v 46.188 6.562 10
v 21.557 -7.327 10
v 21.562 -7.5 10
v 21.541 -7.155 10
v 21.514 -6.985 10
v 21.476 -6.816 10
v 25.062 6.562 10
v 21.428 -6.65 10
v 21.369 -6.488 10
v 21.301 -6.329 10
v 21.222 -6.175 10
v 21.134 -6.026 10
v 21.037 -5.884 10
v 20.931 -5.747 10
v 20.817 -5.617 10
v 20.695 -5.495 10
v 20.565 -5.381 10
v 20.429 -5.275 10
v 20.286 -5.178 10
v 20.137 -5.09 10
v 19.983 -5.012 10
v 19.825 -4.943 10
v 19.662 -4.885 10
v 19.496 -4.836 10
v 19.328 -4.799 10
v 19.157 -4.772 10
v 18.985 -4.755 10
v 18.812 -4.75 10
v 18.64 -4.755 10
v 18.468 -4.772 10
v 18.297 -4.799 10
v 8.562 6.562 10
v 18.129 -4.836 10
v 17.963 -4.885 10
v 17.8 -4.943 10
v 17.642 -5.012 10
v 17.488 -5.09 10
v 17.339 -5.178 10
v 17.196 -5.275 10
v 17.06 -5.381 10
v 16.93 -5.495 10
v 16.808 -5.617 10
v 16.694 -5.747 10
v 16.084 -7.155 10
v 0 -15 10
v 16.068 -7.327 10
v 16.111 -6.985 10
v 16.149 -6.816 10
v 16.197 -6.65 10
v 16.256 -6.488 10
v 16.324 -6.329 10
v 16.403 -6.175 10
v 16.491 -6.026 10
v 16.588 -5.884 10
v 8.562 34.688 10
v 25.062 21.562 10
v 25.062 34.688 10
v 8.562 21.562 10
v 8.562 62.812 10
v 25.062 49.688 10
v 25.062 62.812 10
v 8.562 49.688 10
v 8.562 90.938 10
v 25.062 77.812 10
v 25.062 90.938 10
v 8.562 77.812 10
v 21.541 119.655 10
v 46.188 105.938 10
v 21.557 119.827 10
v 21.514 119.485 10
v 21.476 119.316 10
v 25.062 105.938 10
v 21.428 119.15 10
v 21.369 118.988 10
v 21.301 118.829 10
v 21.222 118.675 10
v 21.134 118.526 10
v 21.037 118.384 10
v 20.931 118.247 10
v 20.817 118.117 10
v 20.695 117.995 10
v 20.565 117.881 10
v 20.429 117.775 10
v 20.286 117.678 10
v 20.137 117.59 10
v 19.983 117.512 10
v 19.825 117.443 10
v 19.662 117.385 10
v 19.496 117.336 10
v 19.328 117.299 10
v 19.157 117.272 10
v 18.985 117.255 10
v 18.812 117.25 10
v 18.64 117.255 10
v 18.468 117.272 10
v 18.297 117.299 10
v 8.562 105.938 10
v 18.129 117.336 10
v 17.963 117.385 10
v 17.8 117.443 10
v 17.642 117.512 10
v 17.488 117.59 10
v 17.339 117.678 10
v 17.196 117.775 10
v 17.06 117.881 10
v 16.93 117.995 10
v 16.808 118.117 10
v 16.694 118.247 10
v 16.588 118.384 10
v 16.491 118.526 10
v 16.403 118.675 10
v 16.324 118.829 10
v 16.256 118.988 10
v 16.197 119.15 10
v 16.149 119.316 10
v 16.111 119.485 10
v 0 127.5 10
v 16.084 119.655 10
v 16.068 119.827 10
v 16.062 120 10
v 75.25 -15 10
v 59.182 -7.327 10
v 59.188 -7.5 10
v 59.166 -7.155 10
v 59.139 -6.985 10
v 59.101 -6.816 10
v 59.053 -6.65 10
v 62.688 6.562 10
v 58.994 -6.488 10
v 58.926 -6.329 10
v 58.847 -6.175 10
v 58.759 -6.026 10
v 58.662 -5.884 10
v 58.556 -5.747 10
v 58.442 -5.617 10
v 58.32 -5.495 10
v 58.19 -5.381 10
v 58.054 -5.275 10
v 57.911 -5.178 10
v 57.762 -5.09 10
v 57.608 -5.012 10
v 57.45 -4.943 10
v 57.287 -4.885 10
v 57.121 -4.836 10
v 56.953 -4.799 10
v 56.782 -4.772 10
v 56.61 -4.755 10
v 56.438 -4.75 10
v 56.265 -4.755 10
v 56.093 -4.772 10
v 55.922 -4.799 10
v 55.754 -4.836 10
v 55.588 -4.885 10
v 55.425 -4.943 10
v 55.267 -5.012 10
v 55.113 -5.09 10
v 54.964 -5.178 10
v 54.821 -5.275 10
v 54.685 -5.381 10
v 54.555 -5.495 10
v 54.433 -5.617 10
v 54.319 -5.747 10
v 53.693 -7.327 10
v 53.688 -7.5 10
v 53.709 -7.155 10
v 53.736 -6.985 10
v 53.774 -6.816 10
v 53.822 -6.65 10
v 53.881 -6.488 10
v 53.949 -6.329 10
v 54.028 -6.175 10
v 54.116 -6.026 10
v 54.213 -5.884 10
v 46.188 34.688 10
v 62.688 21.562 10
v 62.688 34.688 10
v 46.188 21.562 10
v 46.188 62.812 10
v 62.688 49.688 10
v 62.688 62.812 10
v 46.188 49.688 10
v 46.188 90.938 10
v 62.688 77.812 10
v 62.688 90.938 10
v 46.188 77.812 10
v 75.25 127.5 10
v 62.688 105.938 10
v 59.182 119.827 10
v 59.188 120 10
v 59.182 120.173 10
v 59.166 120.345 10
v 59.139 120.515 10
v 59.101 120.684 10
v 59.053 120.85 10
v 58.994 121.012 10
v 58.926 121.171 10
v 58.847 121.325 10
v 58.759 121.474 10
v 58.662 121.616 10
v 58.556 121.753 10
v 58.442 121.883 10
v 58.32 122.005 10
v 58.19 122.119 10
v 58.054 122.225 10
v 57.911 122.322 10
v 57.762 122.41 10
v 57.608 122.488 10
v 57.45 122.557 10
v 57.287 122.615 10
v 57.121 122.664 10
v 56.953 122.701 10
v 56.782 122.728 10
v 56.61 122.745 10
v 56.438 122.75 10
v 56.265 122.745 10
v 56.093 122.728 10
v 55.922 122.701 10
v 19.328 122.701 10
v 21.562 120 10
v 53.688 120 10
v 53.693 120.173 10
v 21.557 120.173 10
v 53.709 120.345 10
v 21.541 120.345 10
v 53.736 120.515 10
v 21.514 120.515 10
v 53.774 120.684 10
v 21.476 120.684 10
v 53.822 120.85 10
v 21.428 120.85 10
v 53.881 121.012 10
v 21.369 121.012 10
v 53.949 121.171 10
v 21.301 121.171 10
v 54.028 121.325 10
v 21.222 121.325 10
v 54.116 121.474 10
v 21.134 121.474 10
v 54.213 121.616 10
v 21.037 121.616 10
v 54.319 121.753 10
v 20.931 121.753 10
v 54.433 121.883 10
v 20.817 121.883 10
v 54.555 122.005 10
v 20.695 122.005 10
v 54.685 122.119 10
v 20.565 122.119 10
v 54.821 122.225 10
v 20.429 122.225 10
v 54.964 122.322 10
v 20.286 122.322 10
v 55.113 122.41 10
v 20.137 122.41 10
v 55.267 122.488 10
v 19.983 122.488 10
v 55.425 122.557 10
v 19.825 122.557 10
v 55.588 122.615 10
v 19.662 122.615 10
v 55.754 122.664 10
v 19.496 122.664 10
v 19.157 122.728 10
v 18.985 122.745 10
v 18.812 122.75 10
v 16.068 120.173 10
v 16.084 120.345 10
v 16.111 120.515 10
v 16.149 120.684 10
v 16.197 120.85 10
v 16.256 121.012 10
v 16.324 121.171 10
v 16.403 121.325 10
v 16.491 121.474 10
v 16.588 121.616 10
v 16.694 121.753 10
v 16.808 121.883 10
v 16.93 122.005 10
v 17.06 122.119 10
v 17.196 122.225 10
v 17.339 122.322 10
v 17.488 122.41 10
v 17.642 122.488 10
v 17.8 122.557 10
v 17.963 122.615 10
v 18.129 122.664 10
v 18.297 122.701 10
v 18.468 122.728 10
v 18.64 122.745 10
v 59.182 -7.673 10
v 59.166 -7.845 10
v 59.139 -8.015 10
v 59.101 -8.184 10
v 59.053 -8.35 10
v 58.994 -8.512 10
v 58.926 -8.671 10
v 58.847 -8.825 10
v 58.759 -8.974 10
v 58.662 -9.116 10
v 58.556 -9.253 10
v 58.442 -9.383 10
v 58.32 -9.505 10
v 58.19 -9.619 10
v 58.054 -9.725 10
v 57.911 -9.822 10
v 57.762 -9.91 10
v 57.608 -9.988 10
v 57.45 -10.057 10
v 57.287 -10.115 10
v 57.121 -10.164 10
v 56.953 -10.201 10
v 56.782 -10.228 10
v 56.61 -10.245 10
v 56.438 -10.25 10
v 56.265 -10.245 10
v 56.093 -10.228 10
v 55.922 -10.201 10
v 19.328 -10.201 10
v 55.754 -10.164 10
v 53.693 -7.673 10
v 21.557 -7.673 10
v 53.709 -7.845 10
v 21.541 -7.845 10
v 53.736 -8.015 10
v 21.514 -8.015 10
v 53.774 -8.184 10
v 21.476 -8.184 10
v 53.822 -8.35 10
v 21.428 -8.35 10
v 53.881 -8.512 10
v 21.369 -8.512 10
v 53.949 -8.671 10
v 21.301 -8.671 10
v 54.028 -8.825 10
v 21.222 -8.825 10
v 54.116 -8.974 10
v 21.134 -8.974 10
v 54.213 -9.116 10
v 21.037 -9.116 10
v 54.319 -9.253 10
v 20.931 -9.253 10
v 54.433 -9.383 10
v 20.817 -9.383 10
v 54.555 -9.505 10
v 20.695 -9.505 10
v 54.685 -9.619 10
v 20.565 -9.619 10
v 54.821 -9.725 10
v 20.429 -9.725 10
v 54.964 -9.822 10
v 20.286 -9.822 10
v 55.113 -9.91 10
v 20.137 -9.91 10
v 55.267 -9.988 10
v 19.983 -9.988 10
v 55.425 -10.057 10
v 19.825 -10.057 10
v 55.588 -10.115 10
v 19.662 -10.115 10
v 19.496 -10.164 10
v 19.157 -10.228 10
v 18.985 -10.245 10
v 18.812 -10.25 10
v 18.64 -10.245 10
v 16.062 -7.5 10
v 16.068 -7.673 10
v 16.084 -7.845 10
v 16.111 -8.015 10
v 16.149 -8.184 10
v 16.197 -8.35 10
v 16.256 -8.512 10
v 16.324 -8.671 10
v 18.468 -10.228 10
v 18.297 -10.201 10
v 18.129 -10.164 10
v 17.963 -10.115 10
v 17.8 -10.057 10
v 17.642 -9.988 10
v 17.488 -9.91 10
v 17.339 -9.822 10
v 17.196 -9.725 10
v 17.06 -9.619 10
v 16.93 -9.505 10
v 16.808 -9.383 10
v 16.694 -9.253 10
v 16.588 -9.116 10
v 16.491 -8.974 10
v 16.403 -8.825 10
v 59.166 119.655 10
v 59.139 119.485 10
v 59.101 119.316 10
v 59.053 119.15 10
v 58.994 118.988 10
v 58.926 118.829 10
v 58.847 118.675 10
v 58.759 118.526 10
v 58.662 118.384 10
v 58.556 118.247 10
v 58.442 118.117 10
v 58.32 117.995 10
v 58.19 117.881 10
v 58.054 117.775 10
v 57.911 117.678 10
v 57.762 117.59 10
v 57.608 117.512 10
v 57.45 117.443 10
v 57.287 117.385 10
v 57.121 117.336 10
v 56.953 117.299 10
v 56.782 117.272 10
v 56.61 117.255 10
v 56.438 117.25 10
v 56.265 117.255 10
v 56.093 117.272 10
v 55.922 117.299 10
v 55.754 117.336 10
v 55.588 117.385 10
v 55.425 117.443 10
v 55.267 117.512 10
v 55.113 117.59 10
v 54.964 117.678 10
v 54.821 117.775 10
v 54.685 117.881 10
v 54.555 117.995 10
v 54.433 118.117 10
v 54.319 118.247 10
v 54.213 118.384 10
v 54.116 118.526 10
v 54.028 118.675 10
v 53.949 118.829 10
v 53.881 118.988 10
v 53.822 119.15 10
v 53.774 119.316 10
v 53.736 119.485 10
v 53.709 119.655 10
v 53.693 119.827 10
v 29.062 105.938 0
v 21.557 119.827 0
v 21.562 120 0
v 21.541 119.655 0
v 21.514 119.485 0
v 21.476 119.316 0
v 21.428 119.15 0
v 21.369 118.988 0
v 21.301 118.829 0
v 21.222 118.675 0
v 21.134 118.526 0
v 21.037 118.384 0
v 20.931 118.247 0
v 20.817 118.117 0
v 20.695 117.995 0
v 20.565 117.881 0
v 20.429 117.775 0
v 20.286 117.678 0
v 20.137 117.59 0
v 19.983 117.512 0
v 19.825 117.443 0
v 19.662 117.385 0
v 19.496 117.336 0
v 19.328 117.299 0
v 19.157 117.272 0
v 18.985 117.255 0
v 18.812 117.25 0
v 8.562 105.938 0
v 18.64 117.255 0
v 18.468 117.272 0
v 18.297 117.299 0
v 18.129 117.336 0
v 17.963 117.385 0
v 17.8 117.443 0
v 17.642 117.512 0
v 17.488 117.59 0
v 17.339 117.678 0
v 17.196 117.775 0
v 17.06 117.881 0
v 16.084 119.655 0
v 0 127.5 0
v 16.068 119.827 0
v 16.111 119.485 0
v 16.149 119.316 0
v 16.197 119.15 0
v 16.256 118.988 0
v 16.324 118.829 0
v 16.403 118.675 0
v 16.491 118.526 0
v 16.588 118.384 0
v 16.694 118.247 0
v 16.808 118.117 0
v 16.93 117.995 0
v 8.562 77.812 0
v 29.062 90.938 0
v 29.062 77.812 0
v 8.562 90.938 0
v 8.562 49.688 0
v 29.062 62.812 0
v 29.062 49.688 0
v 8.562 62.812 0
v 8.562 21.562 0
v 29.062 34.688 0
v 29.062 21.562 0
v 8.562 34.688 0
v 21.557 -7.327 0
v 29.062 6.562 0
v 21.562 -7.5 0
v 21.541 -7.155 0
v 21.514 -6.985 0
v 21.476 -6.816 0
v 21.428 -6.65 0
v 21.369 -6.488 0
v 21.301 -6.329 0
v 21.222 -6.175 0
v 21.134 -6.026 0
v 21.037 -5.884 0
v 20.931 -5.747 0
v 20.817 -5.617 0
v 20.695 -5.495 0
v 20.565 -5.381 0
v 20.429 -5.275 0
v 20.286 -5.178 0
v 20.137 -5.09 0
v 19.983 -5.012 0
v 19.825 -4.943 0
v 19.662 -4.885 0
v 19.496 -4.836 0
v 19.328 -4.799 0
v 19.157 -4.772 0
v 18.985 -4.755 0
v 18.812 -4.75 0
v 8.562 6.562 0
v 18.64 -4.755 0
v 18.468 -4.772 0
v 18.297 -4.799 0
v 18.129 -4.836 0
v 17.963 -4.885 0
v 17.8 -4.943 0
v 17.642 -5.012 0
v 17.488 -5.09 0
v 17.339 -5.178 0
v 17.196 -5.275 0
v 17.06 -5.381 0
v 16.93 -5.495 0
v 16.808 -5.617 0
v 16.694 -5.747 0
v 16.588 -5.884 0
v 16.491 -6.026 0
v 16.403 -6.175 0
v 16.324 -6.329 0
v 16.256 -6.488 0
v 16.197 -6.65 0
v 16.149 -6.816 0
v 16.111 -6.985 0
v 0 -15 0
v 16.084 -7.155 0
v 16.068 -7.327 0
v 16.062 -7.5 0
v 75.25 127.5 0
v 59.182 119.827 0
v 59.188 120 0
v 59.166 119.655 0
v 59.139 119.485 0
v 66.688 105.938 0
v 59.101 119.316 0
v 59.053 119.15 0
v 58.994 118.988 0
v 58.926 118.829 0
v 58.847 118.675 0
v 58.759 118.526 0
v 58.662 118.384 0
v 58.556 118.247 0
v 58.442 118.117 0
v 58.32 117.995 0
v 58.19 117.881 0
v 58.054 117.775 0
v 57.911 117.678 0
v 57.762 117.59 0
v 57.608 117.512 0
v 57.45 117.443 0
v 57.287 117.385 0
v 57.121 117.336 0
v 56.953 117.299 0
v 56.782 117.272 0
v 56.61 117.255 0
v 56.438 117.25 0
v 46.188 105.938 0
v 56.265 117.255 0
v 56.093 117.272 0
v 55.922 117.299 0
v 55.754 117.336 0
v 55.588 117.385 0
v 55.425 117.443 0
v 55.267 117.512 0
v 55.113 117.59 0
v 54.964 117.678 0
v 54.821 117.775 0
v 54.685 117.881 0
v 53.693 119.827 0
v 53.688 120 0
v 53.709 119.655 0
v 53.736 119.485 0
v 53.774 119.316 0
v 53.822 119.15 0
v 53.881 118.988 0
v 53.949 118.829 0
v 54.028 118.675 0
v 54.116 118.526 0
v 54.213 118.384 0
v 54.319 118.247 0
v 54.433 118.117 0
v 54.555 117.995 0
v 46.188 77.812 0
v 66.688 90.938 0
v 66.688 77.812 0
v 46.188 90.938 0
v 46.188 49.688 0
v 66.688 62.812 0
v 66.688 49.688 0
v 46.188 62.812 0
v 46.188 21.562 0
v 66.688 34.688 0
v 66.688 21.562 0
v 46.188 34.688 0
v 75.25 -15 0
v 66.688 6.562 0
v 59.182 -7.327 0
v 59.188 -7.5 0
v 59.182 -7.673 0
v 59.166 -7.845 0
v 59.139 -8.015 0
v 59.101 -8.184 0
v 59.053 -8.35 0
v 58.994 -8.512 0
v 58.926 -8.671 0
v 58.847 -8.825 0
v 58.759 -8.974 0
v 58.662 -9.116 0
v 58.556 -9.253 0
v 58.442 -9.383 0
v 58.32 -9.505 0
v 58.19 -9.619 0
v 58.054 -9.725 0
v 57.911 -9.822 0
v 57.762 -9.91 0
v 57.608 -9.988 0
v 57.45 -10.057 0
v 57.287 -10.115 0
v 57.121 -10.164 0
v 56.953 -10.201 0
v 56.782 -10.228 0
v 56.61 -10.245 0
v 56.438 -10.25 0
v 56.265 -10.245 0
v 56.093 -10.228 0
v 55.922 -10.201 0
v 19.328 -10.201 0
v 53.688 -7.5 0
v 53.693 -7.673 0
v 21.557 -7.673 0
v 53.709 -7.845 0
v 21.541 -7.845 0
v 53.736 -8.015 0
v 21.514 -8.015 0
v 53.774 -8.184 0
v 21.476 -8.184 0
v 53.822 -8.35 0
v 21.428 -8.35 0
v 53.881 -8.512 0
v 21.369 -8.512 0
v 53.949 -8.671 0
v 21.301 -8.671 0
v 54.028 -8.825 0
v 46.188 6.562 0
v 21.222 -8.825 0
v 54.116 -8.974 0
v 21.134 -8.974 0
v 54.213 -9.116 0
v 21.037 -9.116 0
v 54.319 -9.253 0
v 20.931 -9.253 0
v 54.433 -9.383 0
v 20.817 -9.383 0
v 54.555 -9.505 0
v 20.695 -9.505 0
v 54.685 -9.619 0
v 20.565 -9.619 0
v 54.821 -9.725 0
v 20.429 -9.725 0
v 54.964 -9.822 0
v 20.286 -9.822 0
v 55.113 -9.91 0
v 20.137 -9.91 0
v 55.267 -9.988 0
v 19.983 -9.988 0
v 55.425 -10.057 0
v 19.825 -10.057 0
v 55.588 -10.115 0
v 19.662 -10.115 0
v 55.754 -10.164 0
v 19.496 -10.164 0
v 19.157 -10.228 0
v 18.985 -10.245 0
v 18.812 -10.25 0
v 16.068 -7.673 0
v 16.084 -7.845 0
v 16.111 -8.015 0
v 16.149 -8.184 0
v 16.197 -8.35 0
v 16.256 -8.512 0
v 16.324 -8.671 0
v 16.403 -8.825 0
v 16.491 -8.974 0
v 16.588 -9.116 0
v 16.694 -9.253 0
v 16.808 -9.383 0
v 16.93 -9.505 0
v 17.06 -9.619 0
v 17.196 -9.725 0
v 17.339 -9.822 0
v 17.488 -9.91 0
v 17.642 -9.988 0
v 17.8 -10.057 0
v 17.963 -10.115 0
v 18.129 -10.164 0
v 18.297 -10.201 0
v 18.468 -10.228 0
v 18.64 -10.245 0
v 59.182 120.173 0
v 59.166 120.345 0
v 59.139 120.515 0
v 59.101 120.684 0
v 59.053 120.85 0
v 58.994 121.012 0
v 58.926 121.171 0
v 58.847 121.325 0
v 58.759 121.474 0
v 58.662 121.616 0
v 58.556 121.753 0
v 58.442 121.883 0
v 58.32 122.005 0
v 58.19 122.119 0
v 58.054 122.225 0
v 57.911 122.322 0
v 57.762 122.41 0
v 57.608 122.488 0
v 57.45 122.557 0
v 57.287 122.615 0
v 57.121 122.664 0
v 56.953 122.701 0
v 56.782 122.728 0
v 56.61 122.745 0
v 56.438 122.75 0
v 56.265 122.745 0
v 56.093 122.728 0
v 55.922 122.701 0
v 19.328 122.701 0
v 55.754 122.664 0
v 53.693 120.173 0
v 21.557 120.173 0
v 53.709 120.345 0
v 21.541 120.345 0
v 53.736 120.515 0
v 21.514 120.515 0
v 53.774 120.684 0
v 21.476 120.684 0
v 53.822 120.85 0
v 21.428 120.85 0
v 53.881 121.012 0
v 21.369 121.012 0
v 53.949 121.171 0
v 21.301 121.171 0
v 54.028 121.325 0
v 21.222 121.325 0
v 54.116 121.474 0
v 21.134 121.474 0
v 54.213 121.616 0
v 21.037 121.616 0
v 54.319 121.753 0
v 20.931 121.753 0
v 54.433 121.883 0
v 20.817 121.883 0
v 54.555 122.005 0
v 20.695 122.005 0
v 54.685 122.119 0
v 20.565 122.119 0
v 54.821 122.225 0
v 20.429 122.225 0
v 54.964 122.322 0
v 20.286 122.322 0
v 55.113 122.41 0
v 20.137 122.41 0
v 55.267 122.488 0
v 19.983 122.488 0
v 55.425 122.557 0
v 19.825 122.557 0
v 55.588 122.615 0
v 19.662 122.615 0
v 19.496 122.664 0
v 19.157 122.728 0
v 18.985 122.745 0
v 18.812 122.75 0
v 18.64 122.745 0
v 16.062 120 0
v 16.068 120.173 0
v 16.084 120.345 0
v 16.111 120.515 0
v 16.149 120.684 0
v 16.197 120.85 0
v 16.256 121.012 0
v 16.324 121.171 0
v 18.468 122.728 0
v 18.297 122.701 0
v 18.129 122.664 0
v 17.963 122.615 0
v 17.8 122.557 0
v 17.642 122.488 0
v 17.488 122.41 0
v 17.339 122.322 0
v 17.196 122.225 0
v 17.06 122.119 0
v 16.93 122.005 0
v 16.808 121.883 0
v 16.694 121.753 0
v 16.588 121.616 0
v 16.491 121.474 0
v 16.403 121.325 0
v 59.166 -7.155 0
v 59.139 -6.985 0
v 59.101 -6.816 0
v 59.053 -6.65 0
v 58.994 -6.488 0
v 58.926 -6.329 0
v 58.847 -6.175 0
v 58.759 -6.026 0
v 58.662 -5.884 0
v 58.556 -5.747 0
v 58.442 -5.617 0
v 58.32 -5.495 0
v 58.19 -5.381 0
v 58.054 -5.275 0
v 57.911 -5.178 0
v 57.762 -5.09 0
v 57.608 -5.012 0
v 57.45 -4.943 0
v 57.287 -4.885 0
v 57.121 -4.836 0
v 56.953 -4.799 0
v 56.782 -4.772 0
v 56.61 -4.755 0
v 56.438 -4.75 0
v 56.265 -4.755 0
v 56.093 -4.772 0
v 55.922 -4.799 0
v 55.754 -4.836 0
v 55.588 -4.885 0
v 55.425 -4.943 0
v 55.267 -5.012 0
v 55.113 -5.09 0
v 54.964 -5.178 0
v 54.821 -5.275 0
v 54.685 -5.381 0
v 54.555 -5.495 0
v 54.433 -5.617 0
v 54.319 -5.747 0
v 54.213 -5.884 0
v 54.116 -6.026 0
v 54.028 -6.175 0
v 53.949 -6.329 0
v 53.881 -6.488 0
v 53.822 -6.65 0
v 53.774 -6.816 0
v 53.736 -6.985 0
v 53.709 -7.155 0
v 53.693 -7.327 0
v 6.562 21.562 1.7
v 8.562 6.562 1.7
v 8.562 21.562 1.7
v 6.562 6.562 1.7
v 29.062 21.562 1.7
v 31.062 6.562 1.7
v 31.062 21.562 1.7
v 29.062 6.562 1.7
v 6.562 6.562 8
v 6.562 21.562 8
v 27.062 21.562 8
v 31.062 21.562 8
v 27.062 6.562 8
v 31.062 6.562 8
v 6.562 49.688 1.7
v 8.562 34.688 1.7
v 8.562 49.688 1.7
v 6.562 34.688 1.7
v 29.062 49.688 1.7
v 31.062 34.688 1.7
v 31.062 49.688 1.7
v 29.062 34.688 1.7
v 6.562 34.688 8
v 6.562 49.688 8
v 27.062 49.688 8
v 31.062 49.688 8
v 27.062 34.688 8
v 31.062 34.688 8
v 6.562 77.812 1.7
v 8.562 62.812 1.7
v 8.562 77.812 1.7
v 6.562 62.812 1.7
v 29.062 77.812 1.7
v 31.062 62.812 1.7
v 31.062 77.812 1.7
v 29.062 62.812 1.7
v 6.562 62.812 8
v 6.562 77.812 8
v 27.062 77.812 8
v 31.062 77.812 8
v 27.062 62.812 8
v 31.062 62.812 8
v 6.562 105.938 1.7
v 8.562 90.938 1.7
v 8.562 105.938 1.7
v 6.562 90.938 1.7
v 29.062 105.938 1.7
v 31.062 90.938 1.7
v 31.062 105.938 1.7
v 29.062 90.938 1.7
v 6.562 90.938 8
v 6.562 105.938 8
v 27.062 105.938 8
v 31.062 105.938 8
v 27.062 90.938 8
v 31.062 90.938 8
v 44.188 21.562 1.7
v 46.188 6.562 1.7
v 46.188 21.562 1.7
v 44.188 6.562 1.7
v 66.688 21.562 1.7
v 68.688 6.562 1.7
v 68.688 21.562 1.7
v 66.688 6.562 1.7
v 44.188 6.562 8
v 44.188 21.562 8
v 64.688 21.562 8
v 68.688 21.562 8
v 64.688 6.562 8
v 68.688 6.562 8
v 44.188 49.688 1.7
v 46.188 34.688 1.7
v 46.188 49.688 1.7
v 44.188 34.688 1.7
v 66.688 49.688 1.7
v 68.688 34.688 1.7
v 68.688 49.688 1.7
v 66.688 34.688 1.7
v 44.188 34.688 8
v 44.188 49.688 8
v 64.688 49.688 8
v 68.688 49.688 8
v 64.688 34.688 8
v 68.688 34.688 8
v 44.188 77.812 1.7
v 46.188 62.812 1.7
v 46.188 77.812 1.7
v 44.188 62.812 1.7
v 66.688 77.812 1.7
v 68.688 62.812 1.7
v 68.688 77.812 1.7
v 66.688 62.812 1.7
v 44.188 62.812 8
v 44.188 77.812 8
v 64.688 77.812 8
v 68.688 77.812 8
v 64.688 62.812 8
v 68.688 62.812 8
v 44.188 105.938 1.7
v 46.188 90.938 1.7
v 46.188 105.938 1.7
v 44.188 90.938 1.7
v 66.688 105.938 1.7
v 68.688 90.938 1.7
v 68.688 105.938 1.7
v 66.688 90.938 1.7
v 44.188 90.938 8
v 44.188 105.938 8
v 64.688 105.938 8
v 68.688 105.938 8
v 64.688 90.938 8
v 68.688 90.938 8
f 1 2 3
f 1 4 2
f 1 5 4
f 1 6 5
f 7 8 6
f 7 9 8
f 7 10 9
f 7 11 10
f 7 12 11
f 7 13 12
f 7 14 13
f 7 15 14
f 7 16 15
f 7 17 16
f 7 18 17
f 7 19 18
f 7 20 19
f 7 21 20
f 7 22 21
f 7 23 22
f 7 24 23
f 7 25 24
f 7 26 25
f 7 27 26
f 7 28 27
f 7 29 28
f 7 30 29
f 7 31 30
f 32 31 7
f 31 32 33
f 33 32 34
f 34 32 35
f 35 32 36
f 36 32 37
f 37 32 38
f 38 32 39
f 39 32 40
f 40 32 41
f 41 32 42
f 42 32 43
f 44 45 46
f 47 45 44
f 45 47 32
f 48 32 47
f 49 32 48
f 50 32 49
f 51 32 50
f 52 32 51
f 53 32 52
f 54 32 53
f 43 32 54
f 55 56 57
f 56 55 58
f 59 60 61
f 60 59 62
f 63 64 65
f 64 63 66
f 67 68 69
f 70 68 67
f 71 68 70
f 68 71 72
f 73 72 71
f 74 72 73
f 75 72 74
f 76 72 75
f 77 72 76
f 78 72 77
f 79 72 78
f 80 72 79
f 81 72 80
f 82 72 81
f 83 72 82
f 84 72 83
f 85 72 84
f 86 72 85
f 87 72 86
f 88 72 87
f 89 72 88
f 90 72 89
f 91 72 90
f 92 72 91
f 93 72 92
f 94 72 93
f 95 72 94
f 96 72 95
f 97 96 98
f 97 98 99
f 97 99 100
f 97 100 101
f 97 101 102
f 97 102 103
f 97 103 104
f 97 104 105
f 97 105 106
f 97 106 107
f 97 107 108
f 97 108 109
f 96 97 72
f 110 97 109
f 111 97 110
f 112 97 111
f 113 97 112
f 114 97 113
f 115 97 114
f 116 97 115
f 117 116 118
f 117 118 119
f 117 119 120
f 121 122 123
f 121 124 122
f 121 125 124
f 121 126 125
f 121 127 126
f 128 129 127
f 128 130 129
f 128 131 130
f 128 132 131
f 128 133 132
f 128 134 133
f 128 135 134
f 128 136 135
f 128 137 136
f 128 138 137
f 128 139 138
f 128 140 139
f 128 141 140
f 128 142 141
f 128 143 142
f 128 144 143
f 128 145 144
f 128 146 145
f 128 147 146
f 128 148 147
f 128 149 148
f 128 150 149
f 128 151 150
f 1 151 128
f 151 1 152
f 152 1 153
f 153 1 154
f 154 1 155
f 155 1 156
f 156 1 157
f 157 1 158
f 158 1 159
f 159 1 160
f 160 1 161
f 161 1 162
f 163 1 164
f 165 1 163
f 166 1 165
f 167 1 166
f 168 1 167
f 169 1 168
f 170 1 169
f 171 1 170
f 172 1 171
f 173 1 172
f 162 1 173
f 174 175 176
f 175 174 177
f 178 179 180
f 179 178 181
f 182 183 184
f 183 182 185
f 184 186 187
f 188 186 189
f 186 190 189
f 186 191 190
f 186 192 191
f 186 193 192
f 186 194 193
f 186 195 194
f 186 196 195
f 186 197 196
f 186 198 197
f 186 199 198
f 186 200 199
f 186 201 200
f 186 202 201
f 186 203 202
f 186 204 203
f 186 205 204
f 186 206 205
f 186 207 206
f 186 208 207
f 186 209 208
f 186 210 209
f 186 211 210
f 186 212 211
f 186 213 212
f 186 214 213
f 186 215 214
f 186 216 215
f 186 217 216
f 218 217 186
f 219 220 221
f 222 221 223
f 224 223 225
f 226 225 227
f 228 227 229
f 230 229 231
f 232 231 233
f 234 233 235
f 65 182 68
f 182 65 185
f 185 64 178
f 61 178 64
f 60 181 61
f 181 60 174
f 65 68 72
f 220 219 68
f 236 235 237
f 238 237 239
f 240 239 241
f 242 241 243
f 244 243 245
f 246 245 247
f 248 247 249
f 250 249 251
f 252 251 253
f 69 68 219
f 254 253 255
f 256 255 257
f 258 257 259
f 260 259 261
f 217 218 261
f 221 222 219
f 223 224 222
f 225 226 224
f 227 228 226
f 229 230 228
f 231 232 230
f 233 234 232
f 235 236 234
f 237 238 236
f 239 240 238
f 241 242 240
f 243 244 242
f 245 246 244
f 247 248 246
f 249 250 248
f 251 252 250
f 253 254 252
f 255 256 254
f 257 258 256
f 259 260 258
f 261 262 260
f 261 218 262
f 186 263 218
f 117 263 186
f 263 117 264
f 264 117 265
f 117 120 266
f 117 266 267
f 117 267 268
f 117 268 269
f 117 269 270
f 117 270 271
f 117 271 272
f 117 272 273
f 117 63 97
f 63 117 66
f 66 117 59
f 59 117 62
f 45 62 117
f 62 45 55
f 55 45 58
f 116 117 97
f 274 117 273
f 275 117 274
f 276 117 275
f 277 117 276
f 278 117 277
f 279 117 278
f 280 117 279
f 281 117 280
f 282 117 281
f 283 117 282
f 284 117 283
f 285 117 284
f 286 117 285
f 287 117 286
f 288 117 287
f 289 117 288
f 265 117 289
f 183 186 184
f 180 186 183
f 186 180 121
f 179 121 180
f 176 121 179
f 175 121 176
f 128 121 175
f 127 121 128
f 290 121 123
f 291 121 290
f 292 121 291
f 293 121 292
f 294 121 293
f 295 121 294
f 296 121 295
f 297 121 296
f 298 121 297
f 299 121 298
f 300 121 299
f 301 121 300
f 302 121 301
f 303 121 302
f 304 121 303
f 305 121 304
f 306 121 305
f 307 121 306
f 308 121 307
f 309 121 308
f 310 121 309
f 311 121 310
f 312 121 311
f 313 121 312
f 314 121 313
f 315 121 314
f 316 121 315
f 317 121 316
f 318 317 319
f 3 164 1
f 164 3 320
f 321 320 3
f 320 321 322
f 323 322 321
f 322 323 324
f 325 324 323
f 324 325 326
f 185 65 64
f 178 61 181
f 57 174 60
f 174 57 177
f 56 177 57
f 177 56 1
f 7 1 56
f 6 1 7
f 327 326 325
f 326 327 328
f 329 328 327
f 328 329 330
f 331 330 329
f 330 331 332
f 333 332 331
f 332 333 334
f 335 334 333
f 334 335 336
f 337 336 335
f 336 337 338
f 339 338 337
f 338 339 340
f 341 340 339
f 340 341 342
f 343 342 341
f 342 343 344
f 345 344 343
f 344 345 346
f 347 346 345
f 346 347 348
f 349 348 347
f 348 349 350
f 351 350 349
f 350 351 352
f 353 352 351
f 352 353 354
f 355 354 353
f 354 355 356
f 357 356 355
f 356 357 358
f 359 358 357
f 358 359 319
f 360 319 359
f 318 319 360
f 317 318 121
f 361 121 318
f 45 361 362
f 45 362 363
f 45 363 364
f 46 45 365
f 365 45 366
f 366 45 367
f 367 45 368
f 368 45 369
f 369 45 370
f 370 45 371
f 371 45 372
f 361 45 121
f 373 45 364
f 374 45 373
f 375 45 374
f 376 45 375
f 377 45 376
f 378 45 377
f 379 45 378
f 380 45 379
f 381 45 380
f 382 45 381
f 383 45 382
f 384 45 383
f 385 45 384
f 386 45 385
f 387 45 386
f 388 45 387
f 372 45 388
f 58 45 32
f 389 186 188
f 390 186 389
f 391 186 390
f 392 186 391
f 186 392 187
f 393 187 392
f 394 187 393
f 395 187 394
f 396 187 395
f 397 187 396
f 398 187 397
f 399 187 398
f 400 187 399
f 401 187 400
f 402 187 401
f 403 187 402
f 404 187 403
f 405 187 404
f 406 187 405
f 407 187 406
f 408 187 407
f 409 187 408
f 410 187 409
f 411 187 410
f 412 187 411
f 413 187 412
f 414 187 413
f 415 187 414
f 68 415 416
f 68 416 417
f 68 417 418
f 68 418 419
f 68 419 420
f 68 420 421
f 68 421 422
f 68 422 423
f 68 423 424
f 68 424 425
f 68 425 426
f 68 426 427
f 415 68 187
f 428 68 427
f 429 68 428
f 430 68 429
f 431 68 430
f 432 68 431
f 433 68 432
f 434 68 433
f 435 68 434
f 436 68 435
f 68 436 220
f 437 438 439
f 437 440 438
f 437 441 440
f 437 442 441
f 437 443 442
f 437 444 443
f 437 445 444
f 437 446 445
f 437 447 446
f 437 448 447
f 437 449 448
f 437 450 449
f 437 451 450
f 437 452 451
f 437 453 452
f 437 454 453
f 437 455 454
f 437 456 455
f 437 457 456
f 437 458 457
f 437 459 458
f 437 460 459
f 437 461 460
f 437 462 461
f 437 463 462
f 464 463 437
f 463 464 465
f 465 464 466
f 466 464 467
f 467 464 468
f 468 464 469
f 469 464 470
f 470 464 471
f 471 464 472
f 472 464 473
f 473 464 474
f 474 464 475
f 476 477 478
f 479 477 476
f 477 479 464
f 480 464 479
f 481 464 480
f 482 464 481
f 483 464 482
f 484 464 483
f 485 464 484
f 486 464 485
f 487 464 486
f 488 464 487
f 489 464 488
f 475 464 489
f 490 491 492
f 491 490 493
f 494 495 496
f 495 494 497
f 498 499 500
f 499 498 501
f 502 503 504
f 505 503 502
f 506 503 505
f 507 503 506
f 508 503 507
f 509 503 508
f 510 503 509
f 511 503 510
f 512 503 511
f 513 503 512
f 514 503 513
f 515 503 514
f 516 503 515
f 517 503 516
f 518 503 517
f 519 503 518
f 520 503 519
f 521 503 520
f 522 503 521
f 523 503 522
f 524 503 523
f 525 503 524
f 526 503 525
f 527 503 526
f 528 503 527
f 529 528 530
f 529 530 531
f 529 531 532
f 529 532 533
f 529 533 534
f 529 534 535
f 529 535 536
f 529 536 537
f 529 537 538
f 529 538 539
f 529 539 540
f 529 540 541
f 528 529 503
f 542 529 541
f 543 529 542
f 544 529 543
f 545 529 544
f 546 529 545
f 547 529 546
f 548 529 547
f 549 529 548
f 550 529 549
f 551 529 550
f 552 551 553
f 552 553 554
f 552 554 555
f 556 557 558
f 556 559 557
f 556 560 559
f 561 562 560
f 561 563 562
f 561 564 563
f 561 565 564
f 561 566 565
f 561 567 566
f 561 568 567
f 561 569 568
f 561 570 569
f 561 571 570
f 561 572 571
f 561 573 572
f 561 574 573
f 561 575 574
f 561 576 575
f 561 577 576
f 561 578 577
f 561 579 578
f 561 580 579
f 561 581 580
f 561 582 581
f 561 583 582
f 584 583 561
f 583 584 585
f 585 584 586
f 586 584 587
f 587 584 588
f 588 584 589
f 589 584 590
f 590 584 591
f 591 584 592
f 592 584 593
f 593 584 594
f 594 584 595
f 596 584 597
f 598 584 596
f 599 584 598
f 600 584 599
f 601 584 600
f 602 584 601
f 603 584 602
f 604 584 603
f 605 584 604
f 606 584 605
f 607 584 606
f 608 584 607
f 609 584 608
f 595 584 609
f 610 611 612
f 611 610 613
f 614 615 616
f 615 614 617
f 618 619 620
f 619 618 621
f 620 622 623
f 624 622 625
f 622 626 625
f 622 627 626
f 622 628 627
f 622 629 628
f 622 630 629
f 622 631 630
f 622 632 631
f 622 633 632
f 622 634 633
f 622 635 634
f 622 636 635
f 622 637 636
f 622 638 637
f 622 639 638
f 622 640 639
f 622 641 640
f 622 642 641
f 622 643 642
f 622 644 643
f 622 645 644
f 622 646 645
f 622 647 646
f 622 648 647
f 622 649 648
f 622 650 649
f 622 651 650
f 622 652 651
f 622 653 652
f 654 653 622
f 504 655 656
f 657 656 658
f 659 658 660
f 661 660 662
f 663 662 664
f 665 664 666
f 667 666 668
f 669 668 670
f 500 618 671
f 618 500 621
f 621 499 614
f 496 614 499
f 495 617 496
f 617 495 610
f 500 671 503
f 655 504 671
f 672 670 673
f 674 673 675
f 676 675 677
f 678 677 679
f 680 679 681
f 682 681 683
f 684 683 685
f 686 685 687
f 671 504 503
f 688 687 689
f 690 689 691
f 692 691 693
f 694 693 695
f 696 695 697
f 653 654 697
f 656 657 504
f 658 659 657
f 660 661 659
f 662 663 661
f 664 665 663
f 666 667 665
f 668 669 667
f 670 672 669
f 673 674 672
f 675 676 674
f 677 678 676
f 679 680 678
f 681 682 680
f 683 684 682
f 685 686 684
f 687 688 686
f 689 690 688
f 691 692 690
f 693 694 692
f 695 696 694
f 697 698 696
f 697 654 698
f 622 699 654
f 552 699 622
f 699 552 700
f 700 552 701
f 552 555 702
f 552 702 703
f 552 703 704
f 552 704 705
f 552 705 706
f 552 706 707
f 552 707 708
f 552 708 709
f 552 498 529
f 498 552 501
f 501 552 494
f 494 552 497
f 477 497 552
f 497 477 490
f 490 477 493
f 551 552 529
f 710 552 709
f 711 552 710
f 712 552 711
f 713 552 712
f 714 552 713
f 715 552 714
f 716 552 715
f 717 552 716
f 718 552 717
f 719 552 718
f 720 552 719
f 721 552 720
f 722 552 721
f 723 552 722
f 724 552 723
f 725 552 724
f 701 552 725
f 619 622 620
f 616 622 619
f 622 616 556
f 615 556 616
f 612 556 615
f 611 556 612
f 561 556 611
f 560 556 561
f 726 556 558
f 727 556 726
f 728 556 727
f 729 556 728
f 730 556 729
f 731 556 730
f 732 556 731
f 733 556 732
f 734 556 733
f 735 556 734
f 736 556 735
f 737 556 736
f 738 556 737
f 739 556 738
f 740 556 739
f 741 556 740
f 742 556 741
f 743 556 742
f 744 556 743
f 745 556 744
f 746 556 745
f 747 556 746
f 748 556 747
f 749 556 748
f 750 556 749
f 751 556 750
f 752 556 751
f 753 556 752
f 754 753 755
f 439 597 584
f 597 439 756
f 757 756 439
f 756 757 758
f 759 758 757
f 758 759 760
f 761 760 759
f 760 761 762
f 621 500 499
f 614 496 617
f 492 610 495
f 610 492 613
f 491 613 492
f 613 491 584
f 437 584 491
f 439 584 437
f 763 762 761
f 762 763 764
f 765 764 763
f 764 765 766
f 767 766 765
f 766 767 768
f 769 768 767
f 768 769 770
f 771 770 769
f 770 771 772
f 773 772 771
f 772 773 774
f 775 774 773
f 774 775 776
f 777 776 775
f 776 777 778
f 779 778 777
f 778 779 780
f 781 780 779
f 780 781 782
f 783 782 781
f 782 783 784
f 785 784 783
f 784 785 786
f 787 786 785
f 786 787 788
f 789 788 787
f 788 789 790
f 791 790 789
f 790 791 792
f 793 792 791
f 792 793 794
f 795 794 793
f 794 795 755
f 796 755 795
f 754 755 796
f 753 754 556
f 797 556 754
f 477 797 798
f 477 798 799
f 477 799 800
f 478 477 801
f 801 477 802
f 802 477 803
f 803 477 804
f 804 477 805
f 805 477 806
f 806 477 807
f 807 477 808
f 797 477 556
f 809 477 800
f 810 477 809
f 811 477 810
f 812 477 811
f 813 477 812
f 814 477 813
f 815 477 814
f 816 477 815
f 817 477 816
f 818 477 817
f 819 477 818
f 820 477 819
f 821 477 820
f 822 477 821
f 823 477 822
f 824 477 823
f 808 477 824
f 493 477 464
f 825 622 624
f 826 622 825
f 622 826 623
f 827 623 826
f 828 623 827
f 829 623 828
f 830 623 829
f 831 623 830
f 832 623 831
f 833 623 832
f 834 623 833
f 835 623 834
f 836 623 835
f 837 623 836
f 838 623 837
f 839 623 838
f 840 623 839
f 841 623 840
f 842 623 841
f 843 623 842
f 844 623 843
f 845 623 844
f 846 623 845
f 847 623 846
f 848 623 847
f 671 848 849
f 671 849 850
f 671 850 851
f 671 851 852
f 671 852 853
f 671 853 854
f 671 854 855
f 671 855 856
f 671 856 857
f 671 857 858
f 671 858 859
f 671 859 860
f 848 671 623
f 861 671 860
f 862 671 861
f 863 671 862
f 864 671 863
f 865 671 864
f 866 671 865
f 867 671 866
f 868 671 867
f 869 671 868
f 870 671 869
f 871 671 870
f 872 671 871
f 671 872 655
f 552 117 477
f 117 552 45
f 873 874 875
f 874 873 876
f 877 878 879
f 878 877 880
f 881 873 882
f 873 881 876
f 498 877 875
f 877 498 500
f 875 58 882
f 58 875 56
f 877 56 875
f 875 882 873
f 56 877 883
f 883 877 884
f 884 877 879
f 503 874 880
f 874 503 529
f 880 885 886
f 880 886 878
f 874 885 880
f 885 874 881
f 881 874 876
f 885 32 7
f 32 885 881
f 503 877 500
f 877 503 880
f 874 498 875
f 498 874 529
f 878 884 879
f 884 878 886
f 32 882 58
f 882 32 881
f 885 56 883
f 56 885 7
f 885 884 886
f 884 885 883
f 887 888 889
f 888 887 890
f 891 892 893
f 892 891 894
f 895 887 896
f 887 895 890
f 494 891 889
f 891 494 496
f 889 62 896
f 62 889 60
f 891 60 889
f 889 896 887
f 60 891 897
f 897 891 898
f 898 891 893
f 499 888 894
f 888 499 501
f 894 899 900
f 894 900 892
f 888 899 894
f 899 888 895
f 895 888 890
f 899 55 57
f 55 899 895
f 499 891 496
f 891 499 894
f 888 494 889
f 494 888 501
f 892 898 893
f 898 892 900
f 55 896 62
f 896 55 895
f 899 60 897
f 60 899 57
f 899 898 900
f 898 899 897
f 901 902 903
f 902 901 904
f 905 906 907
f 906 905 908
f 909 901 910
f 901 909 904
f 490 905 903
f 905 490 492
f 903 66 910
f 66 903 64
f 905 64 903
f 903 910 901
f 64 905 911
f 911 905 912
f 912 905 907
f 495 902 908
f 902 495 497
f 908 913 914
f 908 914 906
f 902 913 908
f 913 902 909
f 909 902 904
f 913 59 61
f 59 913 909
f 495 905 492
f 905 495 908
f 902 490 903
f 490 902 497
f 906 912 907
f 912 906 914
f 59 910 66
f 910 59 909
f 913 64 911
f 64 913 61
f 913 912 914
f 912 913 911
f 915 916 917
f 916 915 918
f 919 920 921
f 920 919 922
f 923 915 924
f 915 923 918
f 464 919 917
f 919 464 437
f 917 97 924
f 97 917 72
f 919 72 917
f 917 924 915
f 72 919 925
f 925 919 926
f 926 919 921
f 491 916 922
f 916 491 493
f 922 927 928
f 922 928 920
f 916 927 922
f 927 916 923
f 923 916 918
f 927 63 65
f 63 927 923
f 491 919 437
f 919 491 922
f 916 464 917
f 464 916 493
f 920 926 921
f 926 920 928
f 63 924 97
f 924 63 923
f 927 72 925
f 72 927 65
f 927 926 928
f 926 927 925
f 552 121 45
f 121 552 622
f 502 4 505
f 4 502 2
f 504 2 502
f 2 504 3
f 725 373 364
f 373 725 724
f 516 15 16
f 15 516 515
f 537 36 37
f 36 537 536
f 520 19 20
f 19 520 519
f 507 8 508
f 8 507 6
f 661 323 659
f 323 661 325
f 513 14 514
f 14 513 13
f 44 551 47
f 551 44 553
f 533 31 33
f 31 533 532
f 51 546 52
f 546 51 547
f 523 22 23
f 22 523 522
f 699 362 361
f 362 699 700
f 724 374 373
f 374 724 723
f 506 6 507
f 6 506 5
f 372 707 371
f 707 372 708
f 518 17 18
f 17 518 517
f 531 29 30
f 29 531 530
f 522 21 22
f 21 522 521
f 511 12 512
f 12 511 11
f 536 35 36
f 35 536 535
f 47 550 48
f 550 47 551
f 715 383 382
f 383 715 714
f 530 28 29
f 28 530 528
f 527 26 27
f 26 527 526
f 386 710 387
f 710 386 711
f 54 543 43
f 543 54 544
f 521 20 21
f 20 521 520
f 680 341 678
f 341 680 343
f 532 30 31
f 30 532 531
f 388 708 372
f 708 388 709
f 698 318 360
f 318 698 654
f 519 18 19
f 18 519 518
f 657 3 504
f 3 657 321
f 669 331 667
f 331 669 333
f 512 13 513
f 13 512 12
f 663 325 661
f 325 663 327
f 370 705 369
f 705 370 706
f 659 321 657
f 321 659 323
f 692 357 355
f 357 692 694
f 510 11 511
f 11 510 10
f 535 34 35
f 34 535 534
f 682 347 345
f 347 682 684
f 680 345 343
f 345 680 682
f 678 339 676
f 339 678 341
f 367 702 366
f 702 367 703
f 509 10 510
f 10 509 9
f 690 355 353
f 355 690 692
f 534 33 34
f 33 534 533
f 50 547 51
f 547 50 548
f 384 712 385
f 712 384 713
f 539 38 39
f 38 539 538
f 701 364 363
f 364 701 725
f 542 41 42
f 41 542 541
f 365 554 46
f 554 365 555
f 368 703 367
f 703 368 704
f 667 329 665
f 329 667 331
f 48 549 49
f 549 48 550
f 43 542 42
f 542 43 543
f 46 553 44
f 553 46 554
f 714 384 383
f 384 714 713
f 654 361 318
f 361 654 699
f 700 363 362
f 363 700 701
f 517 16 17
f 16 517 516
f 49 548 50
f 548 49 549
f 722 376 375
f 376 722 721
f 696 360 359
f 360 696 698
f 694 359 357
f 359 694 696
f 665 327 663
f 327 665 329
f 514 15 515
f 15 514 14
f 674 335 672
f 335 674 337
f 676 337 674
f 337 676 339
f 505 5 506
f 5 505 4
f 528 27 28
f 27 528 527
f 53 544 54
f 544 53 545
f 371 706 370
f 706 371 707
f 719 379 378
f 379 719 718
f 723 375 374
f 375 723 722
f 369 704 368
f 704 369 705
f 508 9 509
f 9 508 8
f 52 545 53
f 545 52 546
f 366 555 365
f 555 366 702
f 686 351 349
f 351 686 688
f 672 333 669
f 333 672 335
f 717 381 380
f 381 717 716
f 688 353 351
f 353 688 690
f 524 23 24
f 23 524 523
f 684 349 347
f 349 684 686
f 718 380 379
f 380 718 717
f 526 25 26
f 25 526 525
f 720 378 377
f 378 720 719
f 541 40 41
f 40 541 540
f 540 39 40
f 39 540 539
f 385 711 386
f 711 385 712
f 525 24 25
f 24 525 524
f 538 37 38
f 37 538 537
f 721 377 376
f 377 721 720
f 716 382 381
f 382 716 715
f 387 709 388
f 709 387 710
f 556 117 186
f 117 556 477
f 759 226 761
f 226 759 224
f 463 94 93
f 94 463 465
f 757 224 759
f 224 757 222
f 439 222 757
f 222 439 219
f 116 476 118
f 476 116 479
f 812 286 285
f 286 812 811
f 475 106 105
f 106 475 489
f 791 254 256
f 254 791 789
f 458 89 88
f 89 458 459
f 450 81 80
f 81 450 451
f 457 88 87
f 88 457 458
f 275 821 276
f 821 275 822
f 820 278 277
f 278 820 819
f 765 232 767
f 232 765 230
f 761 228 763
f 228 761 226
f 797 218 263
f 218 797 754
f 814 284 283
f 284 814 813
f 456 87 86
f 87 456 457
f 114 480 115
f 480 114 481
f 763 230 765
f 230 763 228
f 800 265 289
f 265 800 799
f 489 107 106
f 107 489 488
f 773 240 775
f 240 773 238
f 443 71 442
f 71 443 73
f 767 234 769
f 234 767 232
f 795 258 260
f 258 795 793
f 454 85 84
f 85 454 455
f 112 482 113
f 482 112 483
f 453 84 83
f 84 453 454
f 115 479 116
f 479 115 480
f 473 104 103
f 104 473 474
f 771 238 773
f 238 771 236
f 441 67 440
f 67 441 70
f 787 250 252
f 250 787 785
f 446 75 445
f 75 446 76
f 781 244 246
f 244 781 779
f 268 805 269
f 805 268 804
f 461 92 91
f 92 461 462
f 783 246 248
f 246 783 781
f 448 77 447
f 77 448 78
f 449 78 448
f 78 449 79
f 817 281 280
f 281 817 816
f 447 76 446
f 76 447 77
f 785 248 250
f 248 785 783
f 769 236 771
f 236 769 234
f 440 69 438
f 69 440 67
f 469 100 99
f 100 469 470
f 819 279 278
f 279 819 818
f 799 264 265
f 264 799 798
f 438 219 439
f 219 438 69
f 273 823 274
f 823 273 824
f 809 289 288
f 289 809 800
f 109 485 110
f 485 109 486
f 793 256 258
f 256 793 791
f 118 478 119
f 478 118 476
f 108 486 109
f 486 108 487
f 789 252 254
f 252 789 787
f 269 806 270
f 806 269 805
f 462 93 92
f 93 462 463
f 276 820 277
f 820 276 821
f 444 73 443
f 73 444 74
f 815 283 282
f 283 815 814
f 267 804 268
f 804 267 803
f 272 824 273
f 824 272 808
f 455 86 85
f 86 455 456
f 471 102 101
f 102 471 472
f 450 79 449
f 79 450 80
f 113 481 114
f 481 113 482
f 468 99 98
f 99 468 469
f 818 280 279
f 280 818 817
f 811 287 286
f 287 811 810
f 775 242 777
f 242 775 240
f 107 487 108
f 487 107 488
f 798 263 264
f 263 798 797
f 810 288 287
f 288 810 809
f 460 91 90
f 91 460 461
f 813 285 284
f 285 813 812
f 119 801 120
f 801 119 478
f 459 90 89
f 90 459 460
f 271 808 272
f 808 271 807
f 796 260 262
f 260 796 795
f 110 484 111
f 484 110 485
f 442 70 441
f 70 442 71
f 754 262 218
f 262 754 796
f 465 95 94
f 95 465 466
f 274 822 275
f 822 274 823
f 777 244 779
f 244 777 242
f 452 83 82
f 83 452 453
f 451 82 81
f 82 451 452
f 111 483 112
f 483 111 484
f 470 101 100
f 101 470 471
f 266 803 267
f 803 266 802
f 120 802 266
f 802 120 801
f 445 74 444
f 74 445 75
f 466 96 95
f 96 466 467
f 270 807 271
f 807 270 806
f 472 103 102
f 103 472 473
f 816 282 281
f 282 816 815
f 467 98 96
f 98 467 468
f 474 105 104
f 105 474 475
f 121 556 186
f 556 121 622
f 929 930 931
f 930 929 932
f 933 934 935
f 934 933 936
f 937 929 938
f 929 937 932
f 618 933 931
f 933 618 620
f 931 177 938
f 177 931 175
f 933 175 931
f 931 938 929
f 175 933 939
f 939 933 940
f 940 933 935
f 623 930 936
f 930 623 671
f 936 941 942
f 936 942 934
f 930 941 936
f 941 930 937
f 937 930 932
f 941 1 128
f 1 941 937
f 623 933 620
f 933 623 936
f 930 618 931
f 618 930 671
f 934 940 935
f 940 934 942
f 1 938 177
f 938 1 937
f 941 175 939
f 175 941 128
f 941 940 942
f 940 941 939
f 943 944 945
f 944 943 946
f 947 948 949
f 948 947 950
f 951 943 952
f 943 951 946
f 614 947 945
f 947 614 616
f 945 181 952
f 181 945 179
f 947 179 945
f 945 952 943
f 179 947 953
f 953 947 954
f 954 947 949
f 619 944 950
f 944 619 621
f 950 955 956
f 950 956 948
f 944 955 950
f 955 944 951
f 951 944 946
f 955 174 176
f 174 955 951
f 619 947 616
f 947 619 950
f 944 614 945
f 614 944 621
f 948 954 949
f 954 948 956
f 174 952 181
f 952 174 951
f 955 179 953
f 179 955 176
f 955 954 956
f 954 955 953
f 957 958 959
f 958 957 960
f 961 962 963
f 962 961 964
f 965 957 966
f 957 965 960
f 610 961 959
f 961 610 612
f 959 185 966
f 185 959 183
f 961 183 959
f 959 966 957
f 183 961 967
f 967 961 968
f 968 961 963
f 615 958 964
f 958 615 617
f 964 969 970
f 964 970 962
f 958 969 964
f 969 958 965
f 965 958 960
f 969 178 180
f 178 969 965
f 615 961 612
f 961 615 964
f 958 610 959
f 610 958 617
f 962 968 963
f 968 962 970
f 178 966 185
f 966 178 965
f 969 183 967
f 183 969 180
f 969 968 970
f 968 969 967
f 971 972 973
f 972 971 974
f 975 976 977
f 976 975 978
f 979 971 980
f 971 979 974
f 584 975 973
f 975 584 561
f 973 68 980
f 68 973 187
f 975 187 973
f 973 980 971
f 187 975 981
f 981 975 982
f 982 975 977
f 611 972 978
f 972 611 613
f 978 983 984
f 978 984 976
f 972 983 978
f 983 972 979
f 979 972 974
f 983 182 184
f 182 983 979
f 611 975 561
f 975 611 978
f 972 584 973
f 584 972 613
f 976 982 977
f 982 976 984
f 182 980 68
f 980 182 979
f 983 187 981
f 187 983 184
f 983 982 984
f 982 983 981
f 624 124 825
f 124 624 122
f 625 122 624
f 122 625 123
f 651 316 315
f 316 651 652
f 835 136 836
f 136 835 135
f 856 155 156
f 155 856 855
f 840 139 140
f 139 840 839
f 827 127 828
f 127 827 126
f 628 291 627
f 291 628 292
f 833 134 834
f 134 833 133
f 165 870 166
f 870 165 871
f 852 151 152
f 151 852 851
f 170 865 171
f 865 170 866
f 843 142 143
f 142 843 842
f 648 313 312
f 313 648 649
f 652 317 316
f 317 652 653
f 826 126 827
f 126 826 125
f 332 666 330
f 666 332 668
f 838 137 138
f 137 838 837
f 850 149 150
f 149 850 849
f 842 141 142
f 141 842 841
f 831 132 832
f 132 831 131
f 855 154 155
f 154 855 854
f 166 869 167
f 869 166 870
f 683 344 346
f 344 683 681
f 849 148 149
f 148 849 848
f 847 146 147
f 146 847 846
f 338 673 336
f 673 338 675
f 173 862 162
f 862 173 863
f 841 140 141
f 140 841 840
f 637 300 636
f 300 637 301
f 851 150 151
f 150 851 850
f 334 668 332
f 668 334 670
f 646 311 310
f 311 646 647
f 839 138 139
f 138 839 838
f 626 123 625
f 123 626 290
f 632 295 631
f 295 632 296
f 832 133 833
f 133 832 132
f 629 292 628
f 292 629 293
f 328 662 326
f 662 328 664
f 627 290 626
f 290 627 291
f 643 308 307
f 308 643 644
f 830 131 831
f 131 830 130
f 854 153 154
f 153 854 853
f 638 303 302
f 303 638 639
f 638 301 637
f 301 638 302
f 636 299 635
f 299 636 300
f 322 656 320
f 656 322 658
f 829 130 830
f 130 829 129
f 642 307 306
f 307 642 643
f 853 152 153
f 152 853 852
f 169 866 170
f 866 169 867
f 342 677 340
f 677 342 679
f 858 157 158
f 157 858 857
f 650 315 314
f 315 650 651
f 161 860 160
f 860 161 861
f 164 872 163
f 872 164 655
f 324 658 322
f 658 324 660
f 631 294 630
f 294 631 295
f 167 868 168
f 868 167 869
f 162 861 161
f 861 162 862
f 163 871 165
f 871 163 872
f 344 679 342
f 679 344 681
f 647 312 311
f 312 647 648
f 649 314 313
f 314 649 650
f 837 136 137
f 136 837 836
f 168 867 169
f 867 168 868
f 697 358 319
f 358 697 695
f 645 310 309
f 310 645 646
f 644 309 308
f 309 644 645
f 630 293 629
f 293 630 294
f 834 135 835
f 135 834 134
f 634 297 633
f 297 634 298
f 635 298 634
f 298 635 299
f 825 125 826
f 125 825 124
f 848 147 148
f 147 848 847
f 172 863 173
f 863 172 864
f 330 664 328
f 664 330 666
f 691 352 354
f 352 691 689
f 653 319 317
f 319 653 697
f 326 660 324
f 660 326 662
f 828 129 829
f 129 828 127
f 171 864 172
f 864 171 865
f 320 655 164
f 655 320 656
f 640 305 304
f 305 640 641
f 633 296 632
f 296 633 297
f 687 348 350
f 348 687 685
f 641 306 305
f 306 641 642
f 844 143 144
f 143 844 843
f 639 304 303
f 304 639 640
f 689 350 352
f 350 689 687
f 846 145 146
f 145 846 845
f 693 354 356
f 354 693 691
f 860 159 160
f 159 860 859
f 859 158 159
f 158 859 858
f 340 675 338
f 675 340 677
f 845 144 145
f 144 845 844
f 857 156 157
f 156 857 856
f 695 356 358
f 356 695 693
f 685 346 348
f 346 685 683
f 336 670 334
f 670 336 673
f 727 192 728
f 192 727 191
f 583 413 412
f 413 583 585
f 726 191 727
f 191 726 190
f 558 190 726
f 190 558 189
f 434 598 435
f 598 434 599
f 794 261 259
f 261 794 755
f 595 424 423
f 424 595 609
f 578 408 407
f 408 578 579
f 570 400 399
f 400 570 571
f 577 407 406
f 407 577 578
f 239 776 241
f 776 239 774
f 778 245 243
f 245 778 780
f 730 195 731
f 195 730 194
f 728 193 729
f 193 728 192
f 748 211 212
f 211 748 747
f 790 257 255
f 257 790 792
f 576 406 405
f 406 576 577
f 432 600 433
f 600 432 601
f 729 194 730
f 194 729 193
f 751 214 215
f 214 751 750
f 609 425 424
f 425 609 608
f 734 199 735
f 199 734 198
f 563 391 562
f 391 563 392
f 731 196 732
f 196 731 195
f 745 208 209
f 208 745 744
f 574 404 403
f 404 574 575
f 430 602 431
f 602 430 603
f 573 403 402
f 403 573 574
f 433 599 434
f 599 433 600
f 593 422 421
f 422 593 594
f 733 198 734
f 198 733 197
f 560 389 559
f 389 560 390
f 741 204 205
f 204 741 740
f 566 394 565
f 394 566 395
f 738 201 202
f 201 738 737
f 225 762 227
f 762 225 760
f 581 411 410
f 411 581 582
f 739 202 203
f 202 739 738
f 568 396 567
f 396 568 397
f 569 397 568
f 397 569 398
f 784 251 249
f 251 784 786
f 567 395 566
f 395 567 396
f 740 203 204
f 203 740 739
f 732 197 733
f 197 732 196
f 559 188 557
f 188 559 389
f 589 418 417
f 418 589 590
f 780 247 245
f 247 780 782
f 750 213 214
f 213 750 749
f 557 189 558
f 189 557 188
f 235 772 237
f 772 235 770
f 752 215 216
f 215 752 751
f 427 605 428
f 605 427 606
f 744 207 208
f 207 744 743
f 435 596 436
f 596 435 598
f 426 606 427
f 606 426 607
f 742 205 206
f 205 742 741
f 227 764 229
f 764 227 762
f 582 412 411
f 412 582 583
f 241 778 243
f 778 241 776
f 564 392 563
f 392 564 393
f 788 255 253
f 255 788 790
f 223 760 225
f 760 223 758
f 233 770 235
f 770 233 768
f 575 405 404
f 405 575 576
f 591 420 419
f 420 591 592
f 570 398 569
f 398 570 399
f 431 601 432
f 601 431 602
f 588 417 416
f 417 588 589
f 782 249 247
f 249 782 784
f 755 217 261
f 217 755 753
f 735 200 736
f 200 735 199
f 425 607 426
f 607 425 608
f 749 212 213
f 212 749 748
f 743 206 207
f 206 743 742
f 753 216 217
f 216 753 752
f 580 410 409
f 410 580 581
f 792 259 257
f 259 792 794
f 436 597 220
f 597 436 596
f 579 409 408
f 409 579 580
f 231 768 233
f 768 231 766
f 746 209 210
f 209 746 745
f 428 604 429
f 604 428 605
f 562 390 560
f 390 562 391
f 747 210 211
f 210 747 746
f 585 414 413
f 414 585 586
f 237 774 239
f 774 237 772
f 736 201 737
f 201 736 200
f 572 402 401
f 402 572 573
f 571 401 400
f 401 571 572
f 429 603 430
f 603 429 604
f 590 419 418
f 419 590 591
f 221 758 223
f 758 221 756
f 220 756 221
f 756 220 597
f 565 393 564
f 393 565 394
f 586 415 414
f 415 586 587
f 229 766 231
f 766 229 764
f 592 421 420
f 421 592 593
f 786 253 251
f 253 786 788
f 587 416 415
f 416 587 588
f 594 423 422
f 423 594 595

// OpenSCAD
/*
 *  This is a cleaned up version of the keystone mounting jack by
 *  jsadusk on thingiverse.com.  I've changed it so you can make
 *  keystone patch panels with an arbitrary number of rows and columns.
 *
 *  I've also added some optional mounting brackets that will fit M5 
 *  screws.
 * 
 *  Shawn Wilson
 *  Aug 27, 2016
 */
 
/****************
 * Modify the settings below accordingly.  
 * 
 * For example, the following values will make a 16 port patch panel 
 * that can be mounted in a standard 19in rack:
 *
 *  num_jacks = 16;
 *  num_rows = 1;
 *  wall_thickness_x = 6.5625;
 *  wall_thickness_y = 6.5625;
 *  mounting_brackets = true;
 *
 ****************/

// Number of columns 
num_jacks = 4;
// Number of rows
num_rows = 2;

// Pad the height of each row (mm).  Industry standard is 6.5625.
height_padding = 6.5625;  

// Pad the spacing between each jack (mm).  Industry standard is 6.5625.
width_padding = 6.5625;

// Specify if you want mounting holes on the sides.
mounting_brackets = true ;

// in mm
mount_hole_diameter = 5.5;

/* 
 *  The soffits are the overhangs that make the front of the faceplate
 *  look pretty.  However, leaving the soffits off can make it easier to
 *  pop the jack out from the front with a screwdriver.
 */
top_soffit = true;
bottom_soffit = true;
/***************/


/* [hidden] */
wall_thickness_x = height_padding;
wall_thickness_y = width_padding;

wall_height = 10;
jack_length = 20.5;
jack_width = 15;
bracket_width = 15;

catch_overhang = 2;
small_clip_depth = catch_overhang;
big_clip_depth = catch_overhang + 2;
big_clip_clearance = 1.7;
small_clip_clearance = 6.5;

outer_length = jack_length + big_clip_depth +
                            (wall_thickness_x * 2);
outer_width = jack_width + (wall_thickness_y * 2);
;
total_outer_length = outer_length * num_rows;
total_outer_width = outer_width * num_jacks;
mount_hole_distance = (outer_width * num_jacks) + bracket_width;

echo ("-----------------");
echo ("jack width:", outer_width, "jack length:", outer_length);
echo ("total width:", total_outer_width, "total length", total_outer_length);
echo ("distance between mounting holes:", mount_hole_distance);
echo ("-----------------");

/*
 *  This is the overhang that hides the clips so you can't see
 *  them from the front. 
 */
module clip_soffit(overhang = 2) {
  rotate([90, 0, 0]) {
    linear_extrude(height = outer_width) {
      polygon(points = [[0,0],
                        [overhang, 0],
                        [2 + overhang, 2],
                        [0,2]],
              paths = [[0,1,2,3]]);
    }
  }
}


/* 
 *  This draws a single keystone module. 
 */
module keystone() {
    union() {
    
        difference() {
          difference() {
            cube([outer_length, outer_width, wall_height]);
            translate([wall_thickness_x, wall_thickness_y, big_clip_clearance]) {
              cube([outer_length, jack_width, wall_height]);
            }
          }
          translate([wall_thickness_x + small_clip_depth, wall_thickness_y, 0]){
            cube([jack_length, jack_width, wall_height + 1]);
          }
        }
    
        cube([wall_thickness_x, outer_width, wall_height]);
        translate([outer_length - wall_thickness_x,0,0]) {
          cube([wall_thickness_x, outer_width, wall_height]);
        }

        /* Draw the soffits if requested. */
        if (bottom_soffit) {
            translate([wall_thickness_x, outer_width, wall_height - 2]) {
              clip_soffit(overhang = 0);
            }
        }
        if (top_soffit) {
            translate([outer_length - wall_thickness_x, 0, wall_height - 2]) {
              rotate([0, 0, -180]) {
                clip_soffit(overhang = 4);
              }
            }
        }
    }
}




union() {
    /* Draw the patch panel. */
    for (j = [0 : num_rows - 1] ) {
        for (i = [0 : num_jacks - 1] ) {
            translate([j * outer_length, i * outer_width, 0]) keystone();
        }
        
        /* Add some mounting brackets if requested. */
        if (mounting_brackets) {           
            difference() {
                translate([j * outer_length, -1 * bracket_width, 0]) 
                    cube([outer_length, bracket_width, wall_height]);
                translate([(j * outer_length) + (outer_length / 2),
                           -1 * bracket_width / 2, 
                           0])
                    cylinder(r = mount_hole_diameter / 2, 
                             h = wall_height, 
                             $fn = 100);
            }
            difference() {
                translate([j * outer_length, outer_width * num_jacks, 0]) 
                    cube([outer_length, bracket_width, wall_height]);
                translate([(j * outer_length) + (outer_length / 2), 
                             (num_jacks * outer_width) + (bracket_width) / 2, 
                           0])
                    cylinder(r = mount_hole_diameter / 2,
                             h = wall_height, 
                             $fn = 100);
            }
        }
    }
 }
